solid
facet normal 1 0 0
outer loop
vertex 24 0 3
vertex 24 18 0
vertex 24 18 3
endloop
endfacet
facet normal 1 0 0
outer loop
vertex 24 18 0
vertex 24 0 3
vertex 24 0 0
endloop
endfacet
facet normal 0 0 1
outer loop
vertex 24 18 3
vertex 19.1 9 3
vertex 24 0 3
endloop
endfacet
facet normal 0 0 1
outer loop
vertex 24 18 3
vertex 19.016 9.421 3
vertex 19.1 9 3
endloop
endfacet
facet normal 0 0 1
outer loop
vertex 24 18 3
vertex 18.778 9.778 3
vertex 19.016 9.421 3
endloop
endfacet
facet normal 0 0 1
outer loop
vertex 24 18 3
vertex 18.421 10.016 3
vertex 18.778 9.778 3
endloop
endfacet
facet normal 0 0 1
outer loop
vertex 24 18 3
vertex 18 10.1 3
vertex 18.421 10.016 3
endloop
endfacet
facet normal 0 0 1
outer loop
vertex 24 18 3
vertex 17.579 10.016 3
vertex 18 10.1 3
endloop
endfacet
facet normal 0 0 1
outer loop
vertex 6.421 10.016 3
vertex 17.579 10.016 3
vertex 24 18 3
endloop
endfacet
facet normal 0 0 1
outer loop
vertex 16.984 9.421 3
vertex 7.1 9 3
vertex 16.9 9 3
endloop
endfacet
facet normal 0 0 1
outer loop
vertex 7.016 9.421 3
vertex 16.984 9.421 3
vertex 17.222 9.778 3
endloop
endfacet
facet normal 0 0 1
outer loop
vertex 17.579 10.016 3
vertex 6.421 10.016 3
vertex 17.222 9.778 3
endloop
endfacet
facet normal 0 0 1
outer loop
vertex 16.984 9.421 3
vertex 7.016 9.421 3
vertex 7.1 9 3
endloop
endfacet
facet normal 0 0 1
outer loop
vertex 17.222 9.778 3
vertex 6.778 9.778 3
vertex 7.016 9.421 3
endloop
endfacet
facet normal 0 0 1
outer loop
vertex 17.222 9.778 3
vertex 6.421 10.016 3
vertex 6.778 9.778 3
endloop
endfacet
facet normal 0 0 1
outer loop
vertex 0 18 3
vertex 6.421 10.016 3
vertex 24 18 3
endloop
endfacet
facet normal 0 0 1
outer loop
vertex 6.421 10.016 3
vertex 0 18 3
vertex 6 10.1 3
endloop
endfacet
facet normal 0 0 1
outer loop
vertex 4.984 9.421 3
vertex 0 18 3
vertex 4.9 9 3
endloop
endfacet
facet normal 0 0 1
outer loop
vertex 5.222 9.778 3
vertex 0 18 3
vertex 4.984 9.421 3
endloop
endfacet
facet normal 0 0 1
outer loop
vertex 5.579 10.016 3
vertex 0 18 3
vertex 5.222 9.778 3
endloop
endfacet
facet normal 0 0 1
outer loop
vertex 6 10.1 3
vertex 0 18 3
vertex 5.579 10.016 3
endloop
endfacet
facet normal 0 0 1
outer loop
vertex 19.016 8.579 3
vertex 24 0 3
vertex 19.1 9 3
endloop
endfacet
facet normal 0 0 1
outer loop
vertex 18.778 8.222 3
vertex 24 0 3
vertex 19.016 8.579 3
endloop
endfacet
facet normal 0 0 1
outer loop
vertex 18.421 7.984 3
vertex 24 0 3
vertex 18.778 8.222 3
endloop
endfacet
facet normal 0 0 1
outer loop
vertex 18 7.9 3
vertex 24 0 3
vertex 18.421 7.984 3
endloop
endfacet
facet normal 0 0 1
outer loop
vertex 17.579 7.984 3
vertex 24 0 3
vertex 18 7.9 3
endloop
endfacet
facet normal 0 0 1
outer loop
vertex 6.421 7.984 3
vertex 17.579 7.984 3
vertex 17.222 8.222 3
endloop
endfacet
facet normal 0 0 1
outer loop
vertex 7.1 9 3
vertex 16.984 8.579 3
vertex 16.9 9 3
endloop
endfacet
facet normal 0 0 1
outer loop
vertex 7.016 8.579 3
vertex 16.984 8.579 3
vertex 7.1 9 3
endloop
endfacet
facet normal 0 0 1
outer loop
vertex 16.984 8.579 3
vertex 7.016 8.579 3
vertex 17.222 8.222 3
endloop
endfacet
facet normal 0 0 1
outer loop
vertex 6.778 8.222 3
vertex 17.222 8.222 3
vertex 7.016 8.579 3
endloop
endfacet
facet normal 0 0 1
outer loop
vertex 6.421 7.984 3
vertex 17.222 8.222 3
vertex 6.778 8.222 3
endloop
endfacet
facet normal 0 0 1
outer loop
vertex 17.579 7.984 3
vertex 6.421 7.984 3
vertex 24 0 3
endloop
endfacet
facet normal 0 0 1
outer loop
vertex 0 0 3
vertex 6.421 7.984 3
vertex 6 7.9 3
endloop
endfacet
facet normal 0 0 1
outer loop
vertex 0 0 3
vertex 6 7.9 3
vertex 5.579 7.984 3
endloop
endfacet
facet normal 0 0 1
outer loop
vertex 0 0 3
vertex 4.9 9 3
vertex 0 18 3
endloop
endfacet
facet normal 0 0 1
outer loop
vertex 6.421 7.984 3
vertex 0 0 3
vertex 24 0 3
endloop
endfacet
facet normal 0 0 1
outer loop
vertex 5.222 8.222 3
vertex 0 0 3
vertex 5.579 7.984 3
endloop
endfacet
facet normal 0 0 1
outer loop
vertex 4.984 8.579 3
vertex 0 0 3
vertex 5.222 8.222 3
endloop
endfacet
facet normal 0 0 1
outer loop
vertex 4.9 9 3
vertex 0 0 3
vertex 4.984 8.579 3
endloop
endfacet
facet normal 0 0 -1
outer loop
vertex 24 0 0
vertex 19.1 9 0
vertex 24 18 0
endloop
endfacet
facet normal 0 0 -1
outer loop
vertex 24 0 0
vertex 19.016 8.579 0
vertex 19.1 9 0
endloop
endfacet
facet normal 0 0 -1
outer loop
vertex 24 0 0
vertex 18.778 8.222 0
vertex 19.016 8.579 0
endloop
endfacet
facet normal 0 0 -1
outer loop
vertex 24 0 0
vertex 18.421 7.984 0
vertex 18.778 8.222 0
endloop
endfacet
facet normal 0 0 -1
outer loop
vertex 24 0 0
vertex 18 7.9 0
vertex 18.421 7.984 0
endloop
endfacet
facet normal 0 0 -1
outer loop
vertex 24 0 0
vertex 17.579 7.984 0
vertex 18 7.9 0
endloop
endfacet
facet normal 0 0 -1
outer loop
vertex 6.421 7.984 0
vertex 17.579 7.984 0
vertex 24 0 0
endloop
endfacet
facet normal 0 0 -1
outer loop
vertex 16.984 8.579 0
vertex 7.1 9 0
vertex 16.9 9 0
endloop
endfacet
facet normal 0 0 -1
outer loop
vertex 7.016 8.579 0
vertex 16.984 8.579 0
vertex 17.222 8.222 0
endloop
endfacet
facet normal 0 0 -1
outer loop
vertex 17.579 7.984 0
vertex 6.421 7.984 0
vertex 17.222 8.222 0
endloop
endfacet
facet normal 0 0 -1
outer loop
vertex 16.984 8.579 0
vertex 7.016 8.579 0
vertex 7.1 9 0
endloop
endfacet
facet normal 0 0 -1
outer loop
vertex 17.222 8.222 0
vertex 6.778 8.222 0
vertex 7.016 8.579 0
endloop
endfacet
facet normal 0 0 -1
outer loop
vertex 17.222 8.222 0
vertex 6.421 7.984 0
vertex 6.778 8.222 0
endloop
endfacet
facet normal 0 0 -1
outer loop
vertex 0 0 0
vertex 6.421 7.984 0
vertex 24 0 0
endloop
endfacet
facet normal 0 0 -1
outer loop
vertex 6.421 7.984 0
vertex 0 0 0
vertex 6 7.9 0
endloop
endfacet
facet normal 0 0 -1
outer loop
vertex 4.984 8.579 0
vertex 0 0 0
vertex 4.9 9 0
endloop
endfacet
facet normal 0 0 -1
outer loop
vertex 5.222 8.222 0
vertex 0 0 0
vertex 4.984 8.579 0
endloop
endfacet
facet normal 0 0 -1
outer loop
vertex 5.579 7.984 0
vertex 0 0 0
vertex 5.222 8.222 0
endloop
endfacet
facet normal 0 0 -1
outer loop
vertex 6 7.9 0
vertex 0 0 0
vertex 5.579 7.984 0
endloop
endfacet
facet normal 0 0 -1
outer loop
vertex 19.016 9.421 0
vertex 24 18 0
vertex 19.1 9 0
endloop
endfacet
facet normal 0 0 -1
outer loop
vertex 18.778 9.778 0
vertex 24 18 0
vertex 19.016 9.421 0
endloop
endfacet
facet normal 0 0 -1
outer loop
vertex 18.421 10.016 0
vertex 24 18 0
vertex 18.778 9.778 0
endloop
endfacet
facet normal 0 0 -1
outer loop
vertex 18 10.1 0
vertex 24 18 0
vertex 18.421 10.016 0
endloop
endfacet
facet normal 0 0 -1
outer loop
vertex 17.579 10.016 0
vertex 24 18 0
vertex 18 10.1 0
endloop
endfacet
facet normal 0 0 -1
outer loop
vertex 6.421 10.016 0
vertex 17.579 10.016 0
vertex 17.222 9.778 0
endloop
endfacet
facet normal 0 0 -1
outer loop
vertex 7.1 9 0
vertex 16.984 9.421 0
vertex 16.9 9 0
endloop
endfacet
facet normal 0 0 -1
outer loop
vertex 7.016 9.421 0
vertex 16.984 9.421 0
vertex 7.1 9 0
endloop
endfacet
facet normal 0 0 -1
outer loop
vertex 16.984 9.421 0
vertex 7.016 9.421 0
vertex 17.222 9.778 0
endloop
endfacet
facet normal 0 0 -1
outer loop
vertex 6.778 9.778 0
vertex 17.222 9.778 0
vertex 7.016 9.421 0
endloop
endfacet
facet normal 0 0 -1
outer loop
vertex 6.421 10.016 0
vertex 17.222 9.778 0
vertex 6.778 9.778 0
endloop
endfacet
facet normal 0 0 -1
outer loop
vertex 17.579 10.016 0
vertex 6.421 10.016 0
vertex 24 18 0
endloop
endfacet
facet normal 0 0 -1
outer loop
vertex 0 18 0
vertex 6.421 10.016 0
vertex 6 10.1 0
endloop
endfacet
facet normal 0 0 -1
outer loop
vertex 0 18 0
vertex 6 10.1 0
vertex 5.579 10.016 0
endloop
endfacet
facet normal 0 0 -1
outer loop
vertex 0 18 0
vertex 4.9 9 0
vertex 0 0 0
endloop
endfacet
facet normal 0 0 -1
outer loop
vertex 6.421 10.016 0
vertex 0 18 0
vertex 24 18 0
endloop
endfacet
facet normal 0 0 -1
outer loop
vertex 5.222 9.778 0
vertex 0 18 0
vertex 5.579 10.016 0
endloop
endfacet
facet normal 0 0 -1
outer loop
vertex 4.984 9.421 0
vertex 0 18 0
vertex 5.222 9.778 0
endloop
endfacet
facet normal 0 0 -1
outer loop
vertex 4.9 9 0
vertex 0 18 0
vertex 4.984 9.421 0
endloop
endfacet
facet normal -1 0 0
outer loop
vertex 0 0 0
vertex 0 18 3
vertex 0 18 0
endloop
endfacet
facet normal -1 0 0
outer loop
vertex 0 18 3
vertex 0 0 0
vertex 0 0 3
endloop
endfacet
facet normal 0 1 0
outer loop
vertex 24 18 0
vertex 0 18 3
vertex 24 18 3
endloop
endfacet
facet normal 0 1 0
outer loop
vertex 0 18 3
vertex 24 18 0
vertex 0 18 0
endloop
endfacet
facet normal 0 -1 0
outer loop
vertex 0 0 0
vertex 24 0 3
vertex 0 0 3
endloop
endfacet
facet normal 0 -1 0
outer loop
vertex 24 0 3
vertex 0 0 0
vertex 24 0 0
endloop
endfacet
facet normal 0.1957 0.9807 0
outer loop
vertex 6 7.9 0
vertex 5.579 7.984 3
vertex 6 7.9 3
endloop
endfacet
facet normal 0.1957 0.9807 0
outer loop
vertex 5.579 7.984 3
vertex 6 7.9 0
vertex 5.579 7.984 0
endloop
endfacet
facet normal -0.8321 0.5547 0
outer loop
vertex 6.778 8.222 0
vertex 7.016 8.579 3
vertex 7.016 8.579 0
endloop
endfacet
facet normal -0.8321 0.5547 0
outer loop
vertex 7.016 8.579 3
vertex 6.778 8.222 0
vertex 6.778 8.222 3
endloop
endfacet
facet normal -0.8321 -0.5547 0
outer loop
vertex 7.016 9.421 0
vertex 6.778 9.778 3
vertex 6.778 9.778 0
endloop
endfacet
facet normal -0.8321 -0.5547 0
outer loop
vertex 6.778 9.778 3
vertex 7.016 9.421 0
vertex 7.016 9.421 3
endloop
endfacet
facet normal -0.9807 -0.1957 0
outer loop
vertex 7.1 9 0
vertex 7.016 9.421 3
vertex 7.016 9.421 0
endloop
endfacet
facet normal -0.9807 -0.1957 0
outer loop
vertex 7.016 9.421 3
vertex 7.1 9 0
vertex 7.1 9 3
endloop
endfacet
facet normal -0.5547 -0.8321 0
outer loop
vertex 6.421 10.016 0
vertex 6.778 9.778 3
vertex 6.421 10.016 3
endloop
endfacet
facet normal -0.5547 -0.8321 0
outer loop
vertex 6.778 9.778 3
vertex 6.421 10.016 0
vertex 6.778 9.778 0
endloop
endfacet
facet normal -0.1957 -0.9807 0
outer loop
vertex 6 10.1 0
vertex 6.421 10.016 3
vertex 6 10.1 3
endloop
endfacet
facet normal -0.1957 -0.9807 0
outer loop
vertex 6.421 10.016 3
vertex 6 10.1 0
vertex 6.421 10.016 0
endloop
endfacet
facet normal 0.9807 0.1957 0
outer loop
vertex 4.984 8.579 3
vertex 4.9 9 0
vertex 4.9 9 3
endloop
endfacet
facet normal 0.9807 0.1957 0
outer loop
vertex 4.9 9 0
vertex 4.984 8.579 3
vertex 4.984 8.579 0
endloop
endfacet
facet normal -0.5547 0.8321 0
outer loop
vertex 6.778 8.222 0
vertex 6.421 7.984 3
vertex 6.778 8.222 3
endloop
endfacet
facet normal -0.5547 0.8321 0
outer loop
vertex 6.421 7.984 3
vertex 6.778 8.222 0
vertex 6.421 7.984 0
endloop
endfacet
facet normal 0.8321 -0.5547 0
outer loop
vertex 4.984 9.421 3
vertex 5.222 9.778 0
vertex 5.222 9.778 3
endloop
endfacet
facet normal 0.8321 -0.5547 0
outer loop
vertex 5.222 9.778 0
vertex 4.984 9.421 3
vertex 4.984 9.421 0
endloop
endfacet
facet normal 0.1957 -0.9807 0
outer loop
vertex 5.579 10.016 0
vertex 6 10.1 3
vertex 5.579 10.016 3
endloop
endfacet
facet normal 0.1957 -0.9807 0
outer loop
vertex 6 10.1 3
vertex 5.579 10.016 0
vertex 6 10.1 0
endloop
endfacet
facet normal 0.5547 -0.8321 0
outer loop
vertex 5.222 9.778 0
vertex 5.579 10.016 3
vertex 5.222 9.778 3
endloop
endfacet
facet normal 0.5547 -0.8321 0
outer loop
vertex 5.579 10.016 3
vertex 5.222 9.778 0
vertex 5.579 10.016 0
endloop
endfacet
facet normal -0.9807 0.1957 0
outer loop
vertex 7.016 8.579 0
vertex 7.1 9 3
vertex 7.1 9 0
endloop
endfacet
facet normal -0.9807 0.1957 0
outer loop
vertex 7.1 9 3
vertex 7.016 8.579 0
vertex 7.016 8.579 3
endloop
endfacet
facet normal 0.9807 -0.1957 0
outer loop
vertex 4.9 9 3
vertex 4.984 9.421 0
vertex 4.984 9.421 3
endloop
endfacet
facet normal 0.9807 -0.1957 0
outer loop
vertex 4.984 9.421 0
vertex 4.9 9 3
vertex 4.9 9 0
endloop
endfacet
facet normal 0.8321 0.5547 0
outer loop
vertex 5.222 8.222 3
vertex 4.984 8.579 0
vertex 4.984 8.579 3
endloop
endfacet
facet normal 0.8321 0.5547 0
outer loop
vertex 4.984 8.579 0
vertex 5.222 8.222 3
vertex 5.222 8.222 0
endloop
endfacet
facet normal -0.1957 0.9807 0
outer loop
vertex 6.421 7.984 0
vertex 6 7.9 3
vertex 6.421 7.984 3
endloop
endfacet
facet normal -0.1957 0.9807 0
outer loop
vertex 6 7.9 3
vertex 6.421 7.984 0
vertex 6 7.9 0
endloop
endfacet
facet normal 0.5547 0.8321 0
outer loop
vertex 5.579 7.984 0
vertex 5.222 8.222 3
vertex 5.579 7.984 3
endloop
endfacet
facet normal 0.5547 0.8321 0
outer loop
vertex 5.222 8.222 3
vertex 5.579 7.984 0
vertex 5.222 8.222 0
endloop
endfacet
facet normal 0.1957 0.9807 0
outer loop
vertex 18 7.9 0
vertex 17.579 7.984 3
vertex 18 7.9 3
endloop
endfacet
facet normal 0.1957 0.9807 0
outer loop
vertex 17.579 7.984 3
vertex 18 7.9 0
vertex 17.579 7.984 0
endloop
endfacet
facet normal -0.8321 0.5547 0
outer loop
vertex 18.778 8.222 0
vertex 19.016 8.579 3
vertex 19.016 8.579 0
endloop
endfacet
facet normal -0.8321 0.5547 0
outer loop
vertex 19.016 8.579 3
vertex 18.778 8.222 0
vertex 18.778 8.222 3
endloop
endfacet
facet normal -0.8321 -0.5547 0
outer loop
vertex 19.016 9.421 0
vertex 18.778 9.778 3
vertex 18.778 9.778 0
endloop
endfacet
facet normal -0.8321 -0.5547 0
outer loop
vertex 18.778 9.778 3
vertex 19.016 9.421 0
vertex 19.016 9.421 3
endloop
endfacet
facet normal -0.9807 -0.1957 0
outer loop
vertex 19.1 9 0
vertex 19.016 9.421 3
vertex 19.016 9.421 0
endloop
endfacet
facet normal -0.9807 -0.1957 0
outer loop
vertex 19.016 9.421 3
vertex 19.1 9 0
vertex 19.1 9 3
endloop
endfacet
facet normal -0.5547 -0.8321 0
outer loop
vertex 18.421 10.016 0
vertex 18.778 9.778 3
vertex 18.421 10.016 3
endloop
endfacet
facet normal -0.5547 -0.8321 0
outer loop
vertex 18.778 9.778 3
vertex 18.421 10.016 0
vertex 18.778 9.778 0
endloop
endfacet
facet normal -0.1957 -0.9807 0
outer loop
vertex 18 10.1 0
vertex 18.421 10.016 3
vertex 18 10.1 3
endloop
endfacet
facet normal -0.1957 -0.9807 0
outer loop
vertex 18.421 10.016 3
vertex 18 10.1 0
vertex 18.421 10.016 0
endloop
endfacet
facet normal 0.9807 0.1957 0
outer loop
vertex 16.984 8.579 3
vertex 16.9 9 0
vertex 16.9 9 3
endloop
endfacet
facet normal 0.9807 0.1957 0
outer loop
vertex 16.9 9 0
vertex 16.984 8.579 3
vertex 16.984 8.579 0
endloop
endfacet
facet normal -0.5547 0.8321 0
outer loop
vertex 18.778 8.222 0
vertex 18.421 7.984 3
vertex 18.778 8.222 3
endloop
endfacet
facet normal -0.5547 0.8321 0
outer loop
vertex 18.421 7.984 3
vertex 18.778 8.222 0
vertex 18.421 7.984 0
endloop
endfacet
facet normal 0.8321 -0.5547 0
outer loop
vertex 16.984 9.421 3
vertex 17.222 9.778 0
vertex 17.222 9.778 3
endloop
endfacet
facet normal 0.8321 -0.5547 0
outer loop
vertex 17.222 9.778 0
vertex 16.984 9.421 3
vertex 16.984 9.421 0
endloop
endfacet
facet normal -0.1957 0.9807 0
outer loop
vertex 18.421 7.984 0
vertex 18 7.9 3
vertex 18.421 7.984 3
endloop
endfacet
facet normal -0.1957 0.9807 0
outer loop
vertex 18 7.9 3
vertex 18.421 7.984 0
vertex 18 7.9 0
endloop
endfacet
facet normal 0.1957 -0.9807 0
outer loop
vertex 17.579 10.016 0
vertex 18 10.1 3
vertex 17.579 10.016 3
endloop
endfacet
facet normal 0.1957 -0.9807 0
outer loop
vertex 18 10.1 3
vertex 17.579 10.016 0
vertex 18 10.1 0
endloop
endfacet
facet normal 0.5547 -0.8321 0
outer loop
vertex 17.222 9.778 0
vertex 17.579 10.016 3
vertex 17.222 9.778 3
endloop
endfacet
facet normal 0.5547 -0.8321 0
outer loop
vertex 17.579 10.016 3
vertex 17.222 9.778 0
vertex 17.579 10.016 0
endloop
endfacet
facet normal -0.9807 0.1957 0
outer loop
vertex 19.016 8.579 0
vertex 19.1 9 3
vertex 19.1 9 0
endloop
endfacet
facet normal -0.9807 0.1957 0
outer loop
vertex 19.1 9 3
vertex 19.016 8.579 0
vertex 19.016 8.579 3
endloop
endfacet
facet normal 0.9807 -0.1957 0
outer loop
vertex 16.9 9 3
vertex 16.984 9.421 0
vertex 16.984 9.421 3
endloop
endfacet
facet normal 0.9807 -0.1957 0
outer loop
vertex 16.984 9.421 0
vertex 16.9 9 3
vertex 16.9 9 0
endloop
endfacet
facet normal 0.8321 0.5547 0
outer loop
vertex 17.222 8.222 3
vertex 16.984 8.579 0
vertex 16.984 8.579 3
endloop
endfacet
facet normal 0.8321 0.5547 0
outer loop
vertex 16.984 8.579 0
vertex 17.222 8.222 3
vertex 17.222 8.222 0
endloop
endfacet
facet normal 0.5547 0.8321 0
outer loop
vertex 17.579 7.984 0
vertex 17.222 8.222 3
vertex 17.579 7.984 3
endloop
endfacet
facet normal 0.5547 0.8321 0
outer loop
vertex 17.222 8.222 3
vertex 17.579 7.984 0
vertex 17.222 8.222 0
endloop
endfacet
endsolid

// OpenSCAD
module n20_mount(){
  difference(){
    cube([24,18,3]);
    translate([6,9,-0.1]) cylinder(h=3.2,r=1.1,$fn=16);
    translate([18,9,-0.1]) cylinder(h=3.2,r=1.1,$fn=16);
  }
}
n20_mount();
